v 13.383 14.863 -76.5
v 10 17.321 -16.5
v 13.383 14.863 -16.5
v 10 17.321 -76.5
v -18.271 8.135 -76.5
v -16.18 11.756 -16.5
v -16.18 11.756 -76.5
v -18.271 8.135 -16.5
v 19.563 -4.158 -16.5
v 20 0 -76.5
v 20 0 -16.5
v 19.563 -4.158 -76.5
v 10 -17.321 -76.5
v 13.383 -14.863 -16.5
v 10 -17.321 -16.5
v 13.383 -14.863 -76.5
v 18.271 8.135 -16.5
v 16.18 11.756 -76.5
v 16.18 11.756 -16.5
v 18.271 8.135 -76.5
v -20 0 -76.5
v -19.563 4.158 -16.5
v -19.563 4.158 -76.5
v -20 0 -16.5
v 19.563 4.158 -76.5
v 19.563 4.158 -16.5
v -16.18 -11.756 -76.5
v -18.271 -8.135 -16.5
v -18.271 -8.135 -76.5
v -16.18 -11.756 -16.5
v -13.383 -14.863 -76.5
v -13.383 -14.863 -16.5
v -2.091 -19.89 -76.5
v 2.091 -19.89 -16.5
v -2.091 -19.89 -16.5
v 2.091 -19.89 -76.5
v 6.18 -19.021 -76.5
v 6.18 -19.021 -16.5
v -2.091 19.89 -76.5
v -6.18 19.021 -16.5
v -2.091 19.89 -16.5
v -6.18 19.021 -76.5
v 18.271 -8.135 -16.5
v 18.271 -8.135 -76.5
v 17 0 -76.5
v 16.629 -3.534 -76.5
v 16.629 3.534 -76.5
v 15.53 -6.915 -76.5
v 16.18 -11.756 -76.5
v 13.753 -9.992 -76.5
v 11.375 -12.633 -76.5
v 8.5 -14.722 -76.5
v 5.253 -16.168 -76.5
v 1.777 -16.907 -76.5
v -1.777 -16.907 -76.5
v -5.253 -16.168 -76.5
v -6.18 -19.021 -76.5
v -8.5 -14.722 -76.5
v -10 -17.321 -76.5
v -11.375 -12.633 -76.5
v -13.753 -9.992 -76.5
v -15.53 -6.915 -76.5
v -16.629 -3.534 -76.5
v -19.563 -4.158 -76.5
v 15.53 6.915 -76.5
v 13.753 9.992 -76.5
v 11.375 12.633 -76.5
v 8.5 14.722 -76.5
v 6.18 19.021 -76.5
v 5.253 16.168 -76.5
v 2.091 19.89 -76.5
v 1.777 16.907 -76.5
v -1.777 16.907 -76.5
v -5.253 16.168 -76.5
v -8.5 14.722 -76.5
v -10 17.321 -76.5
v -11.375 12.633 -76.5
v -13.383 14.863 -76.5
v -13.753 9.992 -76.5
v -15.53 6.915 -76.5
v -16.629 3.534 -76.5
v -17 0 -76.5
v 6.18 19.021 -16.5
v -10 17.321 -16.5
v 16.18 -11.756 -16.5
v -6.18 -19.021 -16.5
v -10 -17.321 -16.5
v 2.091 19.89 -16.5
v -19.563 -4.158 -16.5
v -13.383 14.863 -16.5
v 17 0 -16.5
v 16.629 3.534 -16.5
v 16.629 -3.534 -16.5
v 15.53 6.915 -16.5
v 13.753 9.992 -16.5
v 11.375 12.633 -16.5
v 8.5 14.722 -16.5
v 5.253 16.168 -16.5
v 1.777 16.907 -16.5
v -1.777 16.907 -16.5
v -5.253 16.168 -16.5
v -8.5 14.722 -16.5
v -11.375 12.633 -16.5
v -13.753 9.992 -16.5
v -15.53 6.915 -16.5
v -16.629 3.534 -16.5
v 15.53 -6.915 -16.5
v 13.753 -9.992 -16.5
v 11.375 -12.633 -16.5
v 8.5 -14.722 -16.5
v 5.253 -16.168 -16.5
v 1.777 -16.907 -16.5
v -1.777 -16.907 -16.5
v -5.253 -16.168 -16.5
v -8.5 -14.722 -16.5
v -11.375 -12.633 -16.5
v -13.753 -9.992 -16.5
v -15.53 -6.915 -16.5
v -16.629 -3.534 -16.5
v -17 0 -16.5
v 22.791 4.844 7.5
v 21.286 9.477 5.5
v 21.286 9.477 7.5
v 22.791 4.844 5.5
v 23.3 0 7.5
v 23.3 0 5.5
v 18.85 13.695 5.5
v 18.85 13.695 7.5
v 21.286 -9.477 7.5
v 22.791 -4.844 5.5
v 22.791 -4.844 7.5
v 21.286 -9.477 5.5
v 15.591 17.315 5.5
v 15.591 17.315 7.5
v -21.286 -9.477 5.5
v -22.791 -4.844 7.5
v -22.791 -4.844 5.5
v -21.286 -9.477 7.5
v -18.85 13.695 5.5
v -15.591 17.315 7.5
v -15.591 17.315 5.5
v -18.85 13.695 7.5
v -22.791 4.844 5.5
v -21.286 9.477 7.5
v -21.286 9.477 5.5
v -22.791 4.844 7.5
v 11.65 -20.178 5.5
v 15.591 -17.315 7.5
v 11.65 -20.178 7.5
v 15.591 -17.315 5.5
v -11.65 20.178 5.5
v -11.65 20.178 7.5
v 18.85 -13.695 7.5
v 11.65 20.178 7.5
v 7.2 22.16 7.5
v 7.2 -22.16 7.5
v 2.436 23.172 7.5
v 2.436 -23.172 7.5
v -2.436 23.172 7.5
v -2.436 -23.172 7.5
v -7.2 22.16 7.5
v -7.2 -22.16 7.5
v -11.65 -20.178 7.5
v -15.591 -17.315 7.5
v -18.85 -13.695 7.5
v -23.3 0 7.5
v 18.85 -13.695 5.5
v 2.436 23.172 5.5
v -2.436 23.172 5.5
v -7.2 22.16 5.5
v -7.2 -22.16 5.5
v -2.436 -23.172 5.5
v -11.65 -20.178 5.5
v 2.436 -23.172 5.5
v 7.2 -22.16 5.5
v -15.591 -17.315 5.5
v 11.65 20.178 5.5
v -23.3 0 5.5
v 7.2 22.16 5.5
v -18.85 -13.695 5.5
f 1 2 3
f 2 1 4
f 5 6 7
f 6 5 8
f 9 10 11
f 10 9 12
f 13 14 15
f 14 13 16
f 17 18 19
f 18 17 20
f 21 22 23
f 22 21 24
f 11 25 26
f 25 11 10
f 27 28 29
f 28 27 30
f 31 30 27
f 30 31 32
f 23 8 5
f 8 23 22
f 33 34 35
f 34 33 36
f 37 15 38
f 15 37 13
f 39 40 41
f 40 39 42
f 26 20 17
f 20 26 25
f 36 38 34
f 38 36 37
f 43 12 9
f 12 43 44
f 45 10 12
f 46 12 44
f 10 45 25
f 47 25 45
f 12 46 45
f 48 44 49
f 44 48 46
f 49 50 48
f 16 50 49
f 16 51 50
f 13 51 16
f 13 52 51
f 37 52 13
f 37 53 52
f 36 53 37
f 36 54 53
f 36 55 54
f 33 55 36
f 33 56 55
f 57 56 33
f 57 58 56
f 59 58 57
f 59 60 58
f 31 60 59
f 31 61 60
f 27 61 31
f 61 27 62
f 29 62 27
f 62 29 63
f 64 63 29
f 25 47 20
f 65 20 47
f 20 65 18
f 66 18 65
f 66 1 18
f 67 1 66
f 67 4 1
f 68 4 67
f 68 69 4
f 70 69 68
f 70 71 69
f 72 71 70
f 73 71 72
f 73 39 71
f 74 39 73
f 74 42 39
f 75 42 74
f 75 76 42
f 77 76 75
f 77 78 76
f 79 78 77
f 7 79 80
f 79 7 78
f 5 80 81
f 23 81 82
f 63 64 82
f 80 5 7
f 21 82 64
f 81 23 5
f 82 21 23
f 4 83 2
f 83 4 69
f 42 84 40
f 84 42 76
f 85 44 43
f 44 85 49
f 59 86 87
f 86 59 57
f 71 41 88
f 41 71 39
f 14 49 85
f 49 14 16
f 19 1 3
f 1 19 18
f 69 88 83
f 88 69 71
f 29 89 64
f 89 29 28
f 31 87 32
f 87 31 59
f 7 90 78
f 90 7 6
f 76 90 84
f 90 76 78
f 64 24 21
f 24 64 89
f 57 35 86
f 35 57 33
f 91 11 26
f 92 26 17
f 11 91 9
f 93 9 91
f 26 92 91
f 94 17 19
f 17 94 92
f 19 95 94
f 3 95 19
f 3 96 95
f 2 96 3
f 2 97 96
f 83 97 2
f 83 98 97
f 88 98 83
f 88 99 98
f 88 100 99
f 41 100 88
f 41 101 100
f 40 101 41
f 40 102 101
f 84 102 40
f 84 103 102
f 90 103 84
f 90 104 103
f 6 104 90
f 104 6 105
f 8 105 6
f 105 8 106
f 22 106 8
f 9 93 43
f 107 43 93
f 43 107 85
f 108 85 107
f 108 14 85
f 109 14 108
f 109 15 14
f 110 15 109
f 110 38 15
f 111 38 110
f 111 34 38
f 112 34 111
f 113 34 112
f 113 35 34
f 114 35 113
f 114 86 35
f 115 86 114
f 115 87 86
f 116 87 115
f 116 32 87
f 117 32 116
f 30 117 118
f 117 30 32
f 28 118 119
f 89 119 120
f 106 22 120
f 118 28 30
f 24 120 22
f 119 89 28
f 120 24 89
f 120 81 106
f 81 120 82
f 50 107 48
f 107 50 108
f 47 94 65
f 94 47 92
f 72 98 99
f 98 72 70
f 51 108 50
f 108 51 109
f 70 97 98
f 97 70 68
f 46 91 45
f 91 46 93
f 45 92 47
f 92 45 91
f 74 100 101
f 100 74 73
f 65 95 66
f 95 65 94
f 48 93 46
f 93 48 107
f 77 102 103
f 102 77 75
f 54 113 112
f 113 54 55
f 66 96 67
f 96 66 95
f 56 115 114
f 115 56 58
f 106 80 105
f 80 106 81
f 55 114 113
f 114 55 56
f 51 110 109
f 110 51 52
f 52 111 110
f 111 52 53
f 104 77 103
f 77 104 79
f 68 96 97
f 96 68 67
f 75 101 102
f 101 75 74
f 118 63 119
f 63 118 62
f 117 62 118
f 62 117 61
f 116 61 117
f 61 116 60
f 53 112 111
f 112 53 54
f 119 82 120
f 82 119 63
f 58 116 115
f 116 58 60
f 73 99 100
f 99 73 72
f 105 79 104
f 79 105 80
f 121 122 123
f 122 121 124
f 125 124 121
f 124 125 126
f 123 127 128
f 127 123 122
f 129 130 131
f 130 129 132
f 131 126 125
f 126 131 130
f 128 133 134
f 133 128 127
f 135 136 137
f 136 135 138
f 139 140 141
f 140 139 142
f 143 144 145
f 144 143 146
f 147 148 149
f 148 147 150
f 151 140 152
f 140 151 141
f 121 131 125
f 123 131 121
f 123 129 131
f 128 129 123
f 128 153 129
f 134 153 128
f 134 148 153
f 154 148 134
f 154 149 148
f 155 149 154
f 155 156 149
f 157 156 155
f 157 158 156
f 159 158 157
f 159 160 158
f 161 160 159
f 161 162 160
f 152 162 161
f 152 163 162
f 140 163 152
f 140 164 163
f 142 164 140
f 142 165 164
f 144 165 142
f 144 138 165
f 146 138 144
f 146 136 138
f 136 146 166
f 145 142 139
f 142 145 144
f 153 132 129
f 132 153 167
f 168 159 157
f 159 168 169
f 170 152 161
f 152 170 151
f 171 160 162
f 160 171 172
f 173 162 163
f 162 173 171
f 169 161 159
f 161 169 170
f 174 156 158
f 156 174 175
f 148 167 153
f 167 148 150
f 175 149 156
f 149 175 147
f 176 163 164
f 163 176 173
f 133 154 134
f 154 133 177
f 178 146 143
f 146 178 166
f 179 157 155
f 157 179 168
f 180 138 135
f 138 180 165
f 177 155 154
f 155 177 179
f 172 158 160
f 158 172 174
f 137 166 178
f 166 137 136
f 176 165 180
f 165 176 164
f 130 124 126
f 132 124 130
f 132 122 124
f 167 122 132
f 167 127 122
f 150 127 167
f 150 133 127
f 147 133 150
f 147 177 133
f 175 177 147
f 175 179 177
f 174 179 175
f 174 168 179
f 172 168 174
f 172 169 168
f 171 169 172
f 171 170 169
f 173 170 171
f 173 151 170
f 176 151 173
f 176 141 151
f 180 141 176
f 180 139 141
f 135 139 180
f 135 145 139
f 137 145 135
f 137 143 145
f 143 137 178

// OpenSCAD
// Parameters
pipe_outer_diameter_mm = 40; //[20:80:0.1]
cap_outer_diameter_mm = 48; //[24:96:0.1]
cap_total_height_mm = 35; //[18:70:0.1]
socket_insertion_depth_mm = 25; //[12:50:0.1]
cap_wall_thickness_mm = 3; //[1.5:6:0.1]
end_face_thickness_mm = 4; //[2:8:0.1]
clearance_mm = 0.3; //[0.1:1:0.05]
fillet_radius_mm = 1; //[0.5:3:0.1]
grip_rim_radial_mm = 2; //[1:5:0.1]
grip_rim_height_mm = 6; //[3:12:0.1]
stop_shoulder_height_mm = 2; //[1:5:0.1]
overlap_mm = 1; //[0.5:2:0.1]
pipe_visual_length_mm = 60; //[30:120:1]
pipe_wall_thickness_mm = 3; //[1.5:6:0.1]

// HT Pipe - complete geometry
module ht_pipe() {
  color([0.85, 0.85, 0.8]) {
    difference() {
      // Outer pipe
      cylinder(r=pipe_outer_diameter_mm/2, h=pipe_visual_length_mm, center=true);
      // Inner cavity
      translate([0, 0, -overlap_mm/2])
        cylinder(r=pipe_outer_diameter_mm/2 - pipe_wall_thickness_mm, h=pipe_visual_length_mm + overlap_mm, center=true);
    }
  }
}

// Cap - complete geometry
module cap() {
  color([0.2, 0.2, 0.2]) {
    difference() {
      // Cap body with grip rim
      union() {
        // Outer cap body
        cylinder(r=cap_outer_diameter_mm/2, h=cap_total_height_mm, center=true);
        // Grip rim
        translate([0, 0, -cap_total_height_mm/2 + grip_rim_height_mm/2 - overlap_mm])
          cylinder(r=cap_outer_diameter_mm/2 + grip_rim_radial_mm, h=grip_rim_height_mm, center=true);
      }
      // Fillet (rounded edges)
      minkowski() {
        sphere(r=fillet_radius_mm, center=true);
        union() {
          // Outer cap body
          cylinder(r=cap_outer_diameter_mm/2, h=cap_total_height_mm, center=true);
          // Grip rim
          translate([0, 0, -cap_total_height_mm/2 + grip_rim_height_mm/2 - overlap_mm])
            cylinder(r=cap_outer_diameter_mm/2 + grip_rim_radial_mm, h=grip_rim_height_mm, center=true);
        }
      }
      // End face trim
      translate([0, 0, -cap_total_height_mm/2 + (cap_total_height_mm - end_face_thickness_mm)/2 - overlap_mm])
        cylinder(r=cap_outer_diameter_mm/2 + grip_rim_radial_mm + fillet_radius_mm, h=cap_total_height_mm - end_face_thickness_mm, center=true);
      // Inner socket cavity
      translate([0, 0, -cap_total_height_mm/2 + (socket_insertion_depth_mm + overlap_mm)/2])
        cylinder(r=pipe_outer_diameter_mm/2 + clearance_mm, h=socket_insertion_depth_mm + overlap_mm, center=true);
    }
    // Socket stop shoulder
    translate([0, 0, -cap_total_height_mm/2 + socket_insertion_depth_mm - stop_shoulder_height_mm/2])
      cylinder(r=pipe_outer_diameter_mm/2 + clearance_mm + cap_wall_thickness_mm, h=stop_shoulder_height_mm, center=true);
  }
}

// Assembly
module assembly() {
  cap();
  translate([0, 0, -cap_total_height_mm/2 - pipe_visual_length_mm/2 + overlap_mm])
    ht_pipe();
}

assembly();
